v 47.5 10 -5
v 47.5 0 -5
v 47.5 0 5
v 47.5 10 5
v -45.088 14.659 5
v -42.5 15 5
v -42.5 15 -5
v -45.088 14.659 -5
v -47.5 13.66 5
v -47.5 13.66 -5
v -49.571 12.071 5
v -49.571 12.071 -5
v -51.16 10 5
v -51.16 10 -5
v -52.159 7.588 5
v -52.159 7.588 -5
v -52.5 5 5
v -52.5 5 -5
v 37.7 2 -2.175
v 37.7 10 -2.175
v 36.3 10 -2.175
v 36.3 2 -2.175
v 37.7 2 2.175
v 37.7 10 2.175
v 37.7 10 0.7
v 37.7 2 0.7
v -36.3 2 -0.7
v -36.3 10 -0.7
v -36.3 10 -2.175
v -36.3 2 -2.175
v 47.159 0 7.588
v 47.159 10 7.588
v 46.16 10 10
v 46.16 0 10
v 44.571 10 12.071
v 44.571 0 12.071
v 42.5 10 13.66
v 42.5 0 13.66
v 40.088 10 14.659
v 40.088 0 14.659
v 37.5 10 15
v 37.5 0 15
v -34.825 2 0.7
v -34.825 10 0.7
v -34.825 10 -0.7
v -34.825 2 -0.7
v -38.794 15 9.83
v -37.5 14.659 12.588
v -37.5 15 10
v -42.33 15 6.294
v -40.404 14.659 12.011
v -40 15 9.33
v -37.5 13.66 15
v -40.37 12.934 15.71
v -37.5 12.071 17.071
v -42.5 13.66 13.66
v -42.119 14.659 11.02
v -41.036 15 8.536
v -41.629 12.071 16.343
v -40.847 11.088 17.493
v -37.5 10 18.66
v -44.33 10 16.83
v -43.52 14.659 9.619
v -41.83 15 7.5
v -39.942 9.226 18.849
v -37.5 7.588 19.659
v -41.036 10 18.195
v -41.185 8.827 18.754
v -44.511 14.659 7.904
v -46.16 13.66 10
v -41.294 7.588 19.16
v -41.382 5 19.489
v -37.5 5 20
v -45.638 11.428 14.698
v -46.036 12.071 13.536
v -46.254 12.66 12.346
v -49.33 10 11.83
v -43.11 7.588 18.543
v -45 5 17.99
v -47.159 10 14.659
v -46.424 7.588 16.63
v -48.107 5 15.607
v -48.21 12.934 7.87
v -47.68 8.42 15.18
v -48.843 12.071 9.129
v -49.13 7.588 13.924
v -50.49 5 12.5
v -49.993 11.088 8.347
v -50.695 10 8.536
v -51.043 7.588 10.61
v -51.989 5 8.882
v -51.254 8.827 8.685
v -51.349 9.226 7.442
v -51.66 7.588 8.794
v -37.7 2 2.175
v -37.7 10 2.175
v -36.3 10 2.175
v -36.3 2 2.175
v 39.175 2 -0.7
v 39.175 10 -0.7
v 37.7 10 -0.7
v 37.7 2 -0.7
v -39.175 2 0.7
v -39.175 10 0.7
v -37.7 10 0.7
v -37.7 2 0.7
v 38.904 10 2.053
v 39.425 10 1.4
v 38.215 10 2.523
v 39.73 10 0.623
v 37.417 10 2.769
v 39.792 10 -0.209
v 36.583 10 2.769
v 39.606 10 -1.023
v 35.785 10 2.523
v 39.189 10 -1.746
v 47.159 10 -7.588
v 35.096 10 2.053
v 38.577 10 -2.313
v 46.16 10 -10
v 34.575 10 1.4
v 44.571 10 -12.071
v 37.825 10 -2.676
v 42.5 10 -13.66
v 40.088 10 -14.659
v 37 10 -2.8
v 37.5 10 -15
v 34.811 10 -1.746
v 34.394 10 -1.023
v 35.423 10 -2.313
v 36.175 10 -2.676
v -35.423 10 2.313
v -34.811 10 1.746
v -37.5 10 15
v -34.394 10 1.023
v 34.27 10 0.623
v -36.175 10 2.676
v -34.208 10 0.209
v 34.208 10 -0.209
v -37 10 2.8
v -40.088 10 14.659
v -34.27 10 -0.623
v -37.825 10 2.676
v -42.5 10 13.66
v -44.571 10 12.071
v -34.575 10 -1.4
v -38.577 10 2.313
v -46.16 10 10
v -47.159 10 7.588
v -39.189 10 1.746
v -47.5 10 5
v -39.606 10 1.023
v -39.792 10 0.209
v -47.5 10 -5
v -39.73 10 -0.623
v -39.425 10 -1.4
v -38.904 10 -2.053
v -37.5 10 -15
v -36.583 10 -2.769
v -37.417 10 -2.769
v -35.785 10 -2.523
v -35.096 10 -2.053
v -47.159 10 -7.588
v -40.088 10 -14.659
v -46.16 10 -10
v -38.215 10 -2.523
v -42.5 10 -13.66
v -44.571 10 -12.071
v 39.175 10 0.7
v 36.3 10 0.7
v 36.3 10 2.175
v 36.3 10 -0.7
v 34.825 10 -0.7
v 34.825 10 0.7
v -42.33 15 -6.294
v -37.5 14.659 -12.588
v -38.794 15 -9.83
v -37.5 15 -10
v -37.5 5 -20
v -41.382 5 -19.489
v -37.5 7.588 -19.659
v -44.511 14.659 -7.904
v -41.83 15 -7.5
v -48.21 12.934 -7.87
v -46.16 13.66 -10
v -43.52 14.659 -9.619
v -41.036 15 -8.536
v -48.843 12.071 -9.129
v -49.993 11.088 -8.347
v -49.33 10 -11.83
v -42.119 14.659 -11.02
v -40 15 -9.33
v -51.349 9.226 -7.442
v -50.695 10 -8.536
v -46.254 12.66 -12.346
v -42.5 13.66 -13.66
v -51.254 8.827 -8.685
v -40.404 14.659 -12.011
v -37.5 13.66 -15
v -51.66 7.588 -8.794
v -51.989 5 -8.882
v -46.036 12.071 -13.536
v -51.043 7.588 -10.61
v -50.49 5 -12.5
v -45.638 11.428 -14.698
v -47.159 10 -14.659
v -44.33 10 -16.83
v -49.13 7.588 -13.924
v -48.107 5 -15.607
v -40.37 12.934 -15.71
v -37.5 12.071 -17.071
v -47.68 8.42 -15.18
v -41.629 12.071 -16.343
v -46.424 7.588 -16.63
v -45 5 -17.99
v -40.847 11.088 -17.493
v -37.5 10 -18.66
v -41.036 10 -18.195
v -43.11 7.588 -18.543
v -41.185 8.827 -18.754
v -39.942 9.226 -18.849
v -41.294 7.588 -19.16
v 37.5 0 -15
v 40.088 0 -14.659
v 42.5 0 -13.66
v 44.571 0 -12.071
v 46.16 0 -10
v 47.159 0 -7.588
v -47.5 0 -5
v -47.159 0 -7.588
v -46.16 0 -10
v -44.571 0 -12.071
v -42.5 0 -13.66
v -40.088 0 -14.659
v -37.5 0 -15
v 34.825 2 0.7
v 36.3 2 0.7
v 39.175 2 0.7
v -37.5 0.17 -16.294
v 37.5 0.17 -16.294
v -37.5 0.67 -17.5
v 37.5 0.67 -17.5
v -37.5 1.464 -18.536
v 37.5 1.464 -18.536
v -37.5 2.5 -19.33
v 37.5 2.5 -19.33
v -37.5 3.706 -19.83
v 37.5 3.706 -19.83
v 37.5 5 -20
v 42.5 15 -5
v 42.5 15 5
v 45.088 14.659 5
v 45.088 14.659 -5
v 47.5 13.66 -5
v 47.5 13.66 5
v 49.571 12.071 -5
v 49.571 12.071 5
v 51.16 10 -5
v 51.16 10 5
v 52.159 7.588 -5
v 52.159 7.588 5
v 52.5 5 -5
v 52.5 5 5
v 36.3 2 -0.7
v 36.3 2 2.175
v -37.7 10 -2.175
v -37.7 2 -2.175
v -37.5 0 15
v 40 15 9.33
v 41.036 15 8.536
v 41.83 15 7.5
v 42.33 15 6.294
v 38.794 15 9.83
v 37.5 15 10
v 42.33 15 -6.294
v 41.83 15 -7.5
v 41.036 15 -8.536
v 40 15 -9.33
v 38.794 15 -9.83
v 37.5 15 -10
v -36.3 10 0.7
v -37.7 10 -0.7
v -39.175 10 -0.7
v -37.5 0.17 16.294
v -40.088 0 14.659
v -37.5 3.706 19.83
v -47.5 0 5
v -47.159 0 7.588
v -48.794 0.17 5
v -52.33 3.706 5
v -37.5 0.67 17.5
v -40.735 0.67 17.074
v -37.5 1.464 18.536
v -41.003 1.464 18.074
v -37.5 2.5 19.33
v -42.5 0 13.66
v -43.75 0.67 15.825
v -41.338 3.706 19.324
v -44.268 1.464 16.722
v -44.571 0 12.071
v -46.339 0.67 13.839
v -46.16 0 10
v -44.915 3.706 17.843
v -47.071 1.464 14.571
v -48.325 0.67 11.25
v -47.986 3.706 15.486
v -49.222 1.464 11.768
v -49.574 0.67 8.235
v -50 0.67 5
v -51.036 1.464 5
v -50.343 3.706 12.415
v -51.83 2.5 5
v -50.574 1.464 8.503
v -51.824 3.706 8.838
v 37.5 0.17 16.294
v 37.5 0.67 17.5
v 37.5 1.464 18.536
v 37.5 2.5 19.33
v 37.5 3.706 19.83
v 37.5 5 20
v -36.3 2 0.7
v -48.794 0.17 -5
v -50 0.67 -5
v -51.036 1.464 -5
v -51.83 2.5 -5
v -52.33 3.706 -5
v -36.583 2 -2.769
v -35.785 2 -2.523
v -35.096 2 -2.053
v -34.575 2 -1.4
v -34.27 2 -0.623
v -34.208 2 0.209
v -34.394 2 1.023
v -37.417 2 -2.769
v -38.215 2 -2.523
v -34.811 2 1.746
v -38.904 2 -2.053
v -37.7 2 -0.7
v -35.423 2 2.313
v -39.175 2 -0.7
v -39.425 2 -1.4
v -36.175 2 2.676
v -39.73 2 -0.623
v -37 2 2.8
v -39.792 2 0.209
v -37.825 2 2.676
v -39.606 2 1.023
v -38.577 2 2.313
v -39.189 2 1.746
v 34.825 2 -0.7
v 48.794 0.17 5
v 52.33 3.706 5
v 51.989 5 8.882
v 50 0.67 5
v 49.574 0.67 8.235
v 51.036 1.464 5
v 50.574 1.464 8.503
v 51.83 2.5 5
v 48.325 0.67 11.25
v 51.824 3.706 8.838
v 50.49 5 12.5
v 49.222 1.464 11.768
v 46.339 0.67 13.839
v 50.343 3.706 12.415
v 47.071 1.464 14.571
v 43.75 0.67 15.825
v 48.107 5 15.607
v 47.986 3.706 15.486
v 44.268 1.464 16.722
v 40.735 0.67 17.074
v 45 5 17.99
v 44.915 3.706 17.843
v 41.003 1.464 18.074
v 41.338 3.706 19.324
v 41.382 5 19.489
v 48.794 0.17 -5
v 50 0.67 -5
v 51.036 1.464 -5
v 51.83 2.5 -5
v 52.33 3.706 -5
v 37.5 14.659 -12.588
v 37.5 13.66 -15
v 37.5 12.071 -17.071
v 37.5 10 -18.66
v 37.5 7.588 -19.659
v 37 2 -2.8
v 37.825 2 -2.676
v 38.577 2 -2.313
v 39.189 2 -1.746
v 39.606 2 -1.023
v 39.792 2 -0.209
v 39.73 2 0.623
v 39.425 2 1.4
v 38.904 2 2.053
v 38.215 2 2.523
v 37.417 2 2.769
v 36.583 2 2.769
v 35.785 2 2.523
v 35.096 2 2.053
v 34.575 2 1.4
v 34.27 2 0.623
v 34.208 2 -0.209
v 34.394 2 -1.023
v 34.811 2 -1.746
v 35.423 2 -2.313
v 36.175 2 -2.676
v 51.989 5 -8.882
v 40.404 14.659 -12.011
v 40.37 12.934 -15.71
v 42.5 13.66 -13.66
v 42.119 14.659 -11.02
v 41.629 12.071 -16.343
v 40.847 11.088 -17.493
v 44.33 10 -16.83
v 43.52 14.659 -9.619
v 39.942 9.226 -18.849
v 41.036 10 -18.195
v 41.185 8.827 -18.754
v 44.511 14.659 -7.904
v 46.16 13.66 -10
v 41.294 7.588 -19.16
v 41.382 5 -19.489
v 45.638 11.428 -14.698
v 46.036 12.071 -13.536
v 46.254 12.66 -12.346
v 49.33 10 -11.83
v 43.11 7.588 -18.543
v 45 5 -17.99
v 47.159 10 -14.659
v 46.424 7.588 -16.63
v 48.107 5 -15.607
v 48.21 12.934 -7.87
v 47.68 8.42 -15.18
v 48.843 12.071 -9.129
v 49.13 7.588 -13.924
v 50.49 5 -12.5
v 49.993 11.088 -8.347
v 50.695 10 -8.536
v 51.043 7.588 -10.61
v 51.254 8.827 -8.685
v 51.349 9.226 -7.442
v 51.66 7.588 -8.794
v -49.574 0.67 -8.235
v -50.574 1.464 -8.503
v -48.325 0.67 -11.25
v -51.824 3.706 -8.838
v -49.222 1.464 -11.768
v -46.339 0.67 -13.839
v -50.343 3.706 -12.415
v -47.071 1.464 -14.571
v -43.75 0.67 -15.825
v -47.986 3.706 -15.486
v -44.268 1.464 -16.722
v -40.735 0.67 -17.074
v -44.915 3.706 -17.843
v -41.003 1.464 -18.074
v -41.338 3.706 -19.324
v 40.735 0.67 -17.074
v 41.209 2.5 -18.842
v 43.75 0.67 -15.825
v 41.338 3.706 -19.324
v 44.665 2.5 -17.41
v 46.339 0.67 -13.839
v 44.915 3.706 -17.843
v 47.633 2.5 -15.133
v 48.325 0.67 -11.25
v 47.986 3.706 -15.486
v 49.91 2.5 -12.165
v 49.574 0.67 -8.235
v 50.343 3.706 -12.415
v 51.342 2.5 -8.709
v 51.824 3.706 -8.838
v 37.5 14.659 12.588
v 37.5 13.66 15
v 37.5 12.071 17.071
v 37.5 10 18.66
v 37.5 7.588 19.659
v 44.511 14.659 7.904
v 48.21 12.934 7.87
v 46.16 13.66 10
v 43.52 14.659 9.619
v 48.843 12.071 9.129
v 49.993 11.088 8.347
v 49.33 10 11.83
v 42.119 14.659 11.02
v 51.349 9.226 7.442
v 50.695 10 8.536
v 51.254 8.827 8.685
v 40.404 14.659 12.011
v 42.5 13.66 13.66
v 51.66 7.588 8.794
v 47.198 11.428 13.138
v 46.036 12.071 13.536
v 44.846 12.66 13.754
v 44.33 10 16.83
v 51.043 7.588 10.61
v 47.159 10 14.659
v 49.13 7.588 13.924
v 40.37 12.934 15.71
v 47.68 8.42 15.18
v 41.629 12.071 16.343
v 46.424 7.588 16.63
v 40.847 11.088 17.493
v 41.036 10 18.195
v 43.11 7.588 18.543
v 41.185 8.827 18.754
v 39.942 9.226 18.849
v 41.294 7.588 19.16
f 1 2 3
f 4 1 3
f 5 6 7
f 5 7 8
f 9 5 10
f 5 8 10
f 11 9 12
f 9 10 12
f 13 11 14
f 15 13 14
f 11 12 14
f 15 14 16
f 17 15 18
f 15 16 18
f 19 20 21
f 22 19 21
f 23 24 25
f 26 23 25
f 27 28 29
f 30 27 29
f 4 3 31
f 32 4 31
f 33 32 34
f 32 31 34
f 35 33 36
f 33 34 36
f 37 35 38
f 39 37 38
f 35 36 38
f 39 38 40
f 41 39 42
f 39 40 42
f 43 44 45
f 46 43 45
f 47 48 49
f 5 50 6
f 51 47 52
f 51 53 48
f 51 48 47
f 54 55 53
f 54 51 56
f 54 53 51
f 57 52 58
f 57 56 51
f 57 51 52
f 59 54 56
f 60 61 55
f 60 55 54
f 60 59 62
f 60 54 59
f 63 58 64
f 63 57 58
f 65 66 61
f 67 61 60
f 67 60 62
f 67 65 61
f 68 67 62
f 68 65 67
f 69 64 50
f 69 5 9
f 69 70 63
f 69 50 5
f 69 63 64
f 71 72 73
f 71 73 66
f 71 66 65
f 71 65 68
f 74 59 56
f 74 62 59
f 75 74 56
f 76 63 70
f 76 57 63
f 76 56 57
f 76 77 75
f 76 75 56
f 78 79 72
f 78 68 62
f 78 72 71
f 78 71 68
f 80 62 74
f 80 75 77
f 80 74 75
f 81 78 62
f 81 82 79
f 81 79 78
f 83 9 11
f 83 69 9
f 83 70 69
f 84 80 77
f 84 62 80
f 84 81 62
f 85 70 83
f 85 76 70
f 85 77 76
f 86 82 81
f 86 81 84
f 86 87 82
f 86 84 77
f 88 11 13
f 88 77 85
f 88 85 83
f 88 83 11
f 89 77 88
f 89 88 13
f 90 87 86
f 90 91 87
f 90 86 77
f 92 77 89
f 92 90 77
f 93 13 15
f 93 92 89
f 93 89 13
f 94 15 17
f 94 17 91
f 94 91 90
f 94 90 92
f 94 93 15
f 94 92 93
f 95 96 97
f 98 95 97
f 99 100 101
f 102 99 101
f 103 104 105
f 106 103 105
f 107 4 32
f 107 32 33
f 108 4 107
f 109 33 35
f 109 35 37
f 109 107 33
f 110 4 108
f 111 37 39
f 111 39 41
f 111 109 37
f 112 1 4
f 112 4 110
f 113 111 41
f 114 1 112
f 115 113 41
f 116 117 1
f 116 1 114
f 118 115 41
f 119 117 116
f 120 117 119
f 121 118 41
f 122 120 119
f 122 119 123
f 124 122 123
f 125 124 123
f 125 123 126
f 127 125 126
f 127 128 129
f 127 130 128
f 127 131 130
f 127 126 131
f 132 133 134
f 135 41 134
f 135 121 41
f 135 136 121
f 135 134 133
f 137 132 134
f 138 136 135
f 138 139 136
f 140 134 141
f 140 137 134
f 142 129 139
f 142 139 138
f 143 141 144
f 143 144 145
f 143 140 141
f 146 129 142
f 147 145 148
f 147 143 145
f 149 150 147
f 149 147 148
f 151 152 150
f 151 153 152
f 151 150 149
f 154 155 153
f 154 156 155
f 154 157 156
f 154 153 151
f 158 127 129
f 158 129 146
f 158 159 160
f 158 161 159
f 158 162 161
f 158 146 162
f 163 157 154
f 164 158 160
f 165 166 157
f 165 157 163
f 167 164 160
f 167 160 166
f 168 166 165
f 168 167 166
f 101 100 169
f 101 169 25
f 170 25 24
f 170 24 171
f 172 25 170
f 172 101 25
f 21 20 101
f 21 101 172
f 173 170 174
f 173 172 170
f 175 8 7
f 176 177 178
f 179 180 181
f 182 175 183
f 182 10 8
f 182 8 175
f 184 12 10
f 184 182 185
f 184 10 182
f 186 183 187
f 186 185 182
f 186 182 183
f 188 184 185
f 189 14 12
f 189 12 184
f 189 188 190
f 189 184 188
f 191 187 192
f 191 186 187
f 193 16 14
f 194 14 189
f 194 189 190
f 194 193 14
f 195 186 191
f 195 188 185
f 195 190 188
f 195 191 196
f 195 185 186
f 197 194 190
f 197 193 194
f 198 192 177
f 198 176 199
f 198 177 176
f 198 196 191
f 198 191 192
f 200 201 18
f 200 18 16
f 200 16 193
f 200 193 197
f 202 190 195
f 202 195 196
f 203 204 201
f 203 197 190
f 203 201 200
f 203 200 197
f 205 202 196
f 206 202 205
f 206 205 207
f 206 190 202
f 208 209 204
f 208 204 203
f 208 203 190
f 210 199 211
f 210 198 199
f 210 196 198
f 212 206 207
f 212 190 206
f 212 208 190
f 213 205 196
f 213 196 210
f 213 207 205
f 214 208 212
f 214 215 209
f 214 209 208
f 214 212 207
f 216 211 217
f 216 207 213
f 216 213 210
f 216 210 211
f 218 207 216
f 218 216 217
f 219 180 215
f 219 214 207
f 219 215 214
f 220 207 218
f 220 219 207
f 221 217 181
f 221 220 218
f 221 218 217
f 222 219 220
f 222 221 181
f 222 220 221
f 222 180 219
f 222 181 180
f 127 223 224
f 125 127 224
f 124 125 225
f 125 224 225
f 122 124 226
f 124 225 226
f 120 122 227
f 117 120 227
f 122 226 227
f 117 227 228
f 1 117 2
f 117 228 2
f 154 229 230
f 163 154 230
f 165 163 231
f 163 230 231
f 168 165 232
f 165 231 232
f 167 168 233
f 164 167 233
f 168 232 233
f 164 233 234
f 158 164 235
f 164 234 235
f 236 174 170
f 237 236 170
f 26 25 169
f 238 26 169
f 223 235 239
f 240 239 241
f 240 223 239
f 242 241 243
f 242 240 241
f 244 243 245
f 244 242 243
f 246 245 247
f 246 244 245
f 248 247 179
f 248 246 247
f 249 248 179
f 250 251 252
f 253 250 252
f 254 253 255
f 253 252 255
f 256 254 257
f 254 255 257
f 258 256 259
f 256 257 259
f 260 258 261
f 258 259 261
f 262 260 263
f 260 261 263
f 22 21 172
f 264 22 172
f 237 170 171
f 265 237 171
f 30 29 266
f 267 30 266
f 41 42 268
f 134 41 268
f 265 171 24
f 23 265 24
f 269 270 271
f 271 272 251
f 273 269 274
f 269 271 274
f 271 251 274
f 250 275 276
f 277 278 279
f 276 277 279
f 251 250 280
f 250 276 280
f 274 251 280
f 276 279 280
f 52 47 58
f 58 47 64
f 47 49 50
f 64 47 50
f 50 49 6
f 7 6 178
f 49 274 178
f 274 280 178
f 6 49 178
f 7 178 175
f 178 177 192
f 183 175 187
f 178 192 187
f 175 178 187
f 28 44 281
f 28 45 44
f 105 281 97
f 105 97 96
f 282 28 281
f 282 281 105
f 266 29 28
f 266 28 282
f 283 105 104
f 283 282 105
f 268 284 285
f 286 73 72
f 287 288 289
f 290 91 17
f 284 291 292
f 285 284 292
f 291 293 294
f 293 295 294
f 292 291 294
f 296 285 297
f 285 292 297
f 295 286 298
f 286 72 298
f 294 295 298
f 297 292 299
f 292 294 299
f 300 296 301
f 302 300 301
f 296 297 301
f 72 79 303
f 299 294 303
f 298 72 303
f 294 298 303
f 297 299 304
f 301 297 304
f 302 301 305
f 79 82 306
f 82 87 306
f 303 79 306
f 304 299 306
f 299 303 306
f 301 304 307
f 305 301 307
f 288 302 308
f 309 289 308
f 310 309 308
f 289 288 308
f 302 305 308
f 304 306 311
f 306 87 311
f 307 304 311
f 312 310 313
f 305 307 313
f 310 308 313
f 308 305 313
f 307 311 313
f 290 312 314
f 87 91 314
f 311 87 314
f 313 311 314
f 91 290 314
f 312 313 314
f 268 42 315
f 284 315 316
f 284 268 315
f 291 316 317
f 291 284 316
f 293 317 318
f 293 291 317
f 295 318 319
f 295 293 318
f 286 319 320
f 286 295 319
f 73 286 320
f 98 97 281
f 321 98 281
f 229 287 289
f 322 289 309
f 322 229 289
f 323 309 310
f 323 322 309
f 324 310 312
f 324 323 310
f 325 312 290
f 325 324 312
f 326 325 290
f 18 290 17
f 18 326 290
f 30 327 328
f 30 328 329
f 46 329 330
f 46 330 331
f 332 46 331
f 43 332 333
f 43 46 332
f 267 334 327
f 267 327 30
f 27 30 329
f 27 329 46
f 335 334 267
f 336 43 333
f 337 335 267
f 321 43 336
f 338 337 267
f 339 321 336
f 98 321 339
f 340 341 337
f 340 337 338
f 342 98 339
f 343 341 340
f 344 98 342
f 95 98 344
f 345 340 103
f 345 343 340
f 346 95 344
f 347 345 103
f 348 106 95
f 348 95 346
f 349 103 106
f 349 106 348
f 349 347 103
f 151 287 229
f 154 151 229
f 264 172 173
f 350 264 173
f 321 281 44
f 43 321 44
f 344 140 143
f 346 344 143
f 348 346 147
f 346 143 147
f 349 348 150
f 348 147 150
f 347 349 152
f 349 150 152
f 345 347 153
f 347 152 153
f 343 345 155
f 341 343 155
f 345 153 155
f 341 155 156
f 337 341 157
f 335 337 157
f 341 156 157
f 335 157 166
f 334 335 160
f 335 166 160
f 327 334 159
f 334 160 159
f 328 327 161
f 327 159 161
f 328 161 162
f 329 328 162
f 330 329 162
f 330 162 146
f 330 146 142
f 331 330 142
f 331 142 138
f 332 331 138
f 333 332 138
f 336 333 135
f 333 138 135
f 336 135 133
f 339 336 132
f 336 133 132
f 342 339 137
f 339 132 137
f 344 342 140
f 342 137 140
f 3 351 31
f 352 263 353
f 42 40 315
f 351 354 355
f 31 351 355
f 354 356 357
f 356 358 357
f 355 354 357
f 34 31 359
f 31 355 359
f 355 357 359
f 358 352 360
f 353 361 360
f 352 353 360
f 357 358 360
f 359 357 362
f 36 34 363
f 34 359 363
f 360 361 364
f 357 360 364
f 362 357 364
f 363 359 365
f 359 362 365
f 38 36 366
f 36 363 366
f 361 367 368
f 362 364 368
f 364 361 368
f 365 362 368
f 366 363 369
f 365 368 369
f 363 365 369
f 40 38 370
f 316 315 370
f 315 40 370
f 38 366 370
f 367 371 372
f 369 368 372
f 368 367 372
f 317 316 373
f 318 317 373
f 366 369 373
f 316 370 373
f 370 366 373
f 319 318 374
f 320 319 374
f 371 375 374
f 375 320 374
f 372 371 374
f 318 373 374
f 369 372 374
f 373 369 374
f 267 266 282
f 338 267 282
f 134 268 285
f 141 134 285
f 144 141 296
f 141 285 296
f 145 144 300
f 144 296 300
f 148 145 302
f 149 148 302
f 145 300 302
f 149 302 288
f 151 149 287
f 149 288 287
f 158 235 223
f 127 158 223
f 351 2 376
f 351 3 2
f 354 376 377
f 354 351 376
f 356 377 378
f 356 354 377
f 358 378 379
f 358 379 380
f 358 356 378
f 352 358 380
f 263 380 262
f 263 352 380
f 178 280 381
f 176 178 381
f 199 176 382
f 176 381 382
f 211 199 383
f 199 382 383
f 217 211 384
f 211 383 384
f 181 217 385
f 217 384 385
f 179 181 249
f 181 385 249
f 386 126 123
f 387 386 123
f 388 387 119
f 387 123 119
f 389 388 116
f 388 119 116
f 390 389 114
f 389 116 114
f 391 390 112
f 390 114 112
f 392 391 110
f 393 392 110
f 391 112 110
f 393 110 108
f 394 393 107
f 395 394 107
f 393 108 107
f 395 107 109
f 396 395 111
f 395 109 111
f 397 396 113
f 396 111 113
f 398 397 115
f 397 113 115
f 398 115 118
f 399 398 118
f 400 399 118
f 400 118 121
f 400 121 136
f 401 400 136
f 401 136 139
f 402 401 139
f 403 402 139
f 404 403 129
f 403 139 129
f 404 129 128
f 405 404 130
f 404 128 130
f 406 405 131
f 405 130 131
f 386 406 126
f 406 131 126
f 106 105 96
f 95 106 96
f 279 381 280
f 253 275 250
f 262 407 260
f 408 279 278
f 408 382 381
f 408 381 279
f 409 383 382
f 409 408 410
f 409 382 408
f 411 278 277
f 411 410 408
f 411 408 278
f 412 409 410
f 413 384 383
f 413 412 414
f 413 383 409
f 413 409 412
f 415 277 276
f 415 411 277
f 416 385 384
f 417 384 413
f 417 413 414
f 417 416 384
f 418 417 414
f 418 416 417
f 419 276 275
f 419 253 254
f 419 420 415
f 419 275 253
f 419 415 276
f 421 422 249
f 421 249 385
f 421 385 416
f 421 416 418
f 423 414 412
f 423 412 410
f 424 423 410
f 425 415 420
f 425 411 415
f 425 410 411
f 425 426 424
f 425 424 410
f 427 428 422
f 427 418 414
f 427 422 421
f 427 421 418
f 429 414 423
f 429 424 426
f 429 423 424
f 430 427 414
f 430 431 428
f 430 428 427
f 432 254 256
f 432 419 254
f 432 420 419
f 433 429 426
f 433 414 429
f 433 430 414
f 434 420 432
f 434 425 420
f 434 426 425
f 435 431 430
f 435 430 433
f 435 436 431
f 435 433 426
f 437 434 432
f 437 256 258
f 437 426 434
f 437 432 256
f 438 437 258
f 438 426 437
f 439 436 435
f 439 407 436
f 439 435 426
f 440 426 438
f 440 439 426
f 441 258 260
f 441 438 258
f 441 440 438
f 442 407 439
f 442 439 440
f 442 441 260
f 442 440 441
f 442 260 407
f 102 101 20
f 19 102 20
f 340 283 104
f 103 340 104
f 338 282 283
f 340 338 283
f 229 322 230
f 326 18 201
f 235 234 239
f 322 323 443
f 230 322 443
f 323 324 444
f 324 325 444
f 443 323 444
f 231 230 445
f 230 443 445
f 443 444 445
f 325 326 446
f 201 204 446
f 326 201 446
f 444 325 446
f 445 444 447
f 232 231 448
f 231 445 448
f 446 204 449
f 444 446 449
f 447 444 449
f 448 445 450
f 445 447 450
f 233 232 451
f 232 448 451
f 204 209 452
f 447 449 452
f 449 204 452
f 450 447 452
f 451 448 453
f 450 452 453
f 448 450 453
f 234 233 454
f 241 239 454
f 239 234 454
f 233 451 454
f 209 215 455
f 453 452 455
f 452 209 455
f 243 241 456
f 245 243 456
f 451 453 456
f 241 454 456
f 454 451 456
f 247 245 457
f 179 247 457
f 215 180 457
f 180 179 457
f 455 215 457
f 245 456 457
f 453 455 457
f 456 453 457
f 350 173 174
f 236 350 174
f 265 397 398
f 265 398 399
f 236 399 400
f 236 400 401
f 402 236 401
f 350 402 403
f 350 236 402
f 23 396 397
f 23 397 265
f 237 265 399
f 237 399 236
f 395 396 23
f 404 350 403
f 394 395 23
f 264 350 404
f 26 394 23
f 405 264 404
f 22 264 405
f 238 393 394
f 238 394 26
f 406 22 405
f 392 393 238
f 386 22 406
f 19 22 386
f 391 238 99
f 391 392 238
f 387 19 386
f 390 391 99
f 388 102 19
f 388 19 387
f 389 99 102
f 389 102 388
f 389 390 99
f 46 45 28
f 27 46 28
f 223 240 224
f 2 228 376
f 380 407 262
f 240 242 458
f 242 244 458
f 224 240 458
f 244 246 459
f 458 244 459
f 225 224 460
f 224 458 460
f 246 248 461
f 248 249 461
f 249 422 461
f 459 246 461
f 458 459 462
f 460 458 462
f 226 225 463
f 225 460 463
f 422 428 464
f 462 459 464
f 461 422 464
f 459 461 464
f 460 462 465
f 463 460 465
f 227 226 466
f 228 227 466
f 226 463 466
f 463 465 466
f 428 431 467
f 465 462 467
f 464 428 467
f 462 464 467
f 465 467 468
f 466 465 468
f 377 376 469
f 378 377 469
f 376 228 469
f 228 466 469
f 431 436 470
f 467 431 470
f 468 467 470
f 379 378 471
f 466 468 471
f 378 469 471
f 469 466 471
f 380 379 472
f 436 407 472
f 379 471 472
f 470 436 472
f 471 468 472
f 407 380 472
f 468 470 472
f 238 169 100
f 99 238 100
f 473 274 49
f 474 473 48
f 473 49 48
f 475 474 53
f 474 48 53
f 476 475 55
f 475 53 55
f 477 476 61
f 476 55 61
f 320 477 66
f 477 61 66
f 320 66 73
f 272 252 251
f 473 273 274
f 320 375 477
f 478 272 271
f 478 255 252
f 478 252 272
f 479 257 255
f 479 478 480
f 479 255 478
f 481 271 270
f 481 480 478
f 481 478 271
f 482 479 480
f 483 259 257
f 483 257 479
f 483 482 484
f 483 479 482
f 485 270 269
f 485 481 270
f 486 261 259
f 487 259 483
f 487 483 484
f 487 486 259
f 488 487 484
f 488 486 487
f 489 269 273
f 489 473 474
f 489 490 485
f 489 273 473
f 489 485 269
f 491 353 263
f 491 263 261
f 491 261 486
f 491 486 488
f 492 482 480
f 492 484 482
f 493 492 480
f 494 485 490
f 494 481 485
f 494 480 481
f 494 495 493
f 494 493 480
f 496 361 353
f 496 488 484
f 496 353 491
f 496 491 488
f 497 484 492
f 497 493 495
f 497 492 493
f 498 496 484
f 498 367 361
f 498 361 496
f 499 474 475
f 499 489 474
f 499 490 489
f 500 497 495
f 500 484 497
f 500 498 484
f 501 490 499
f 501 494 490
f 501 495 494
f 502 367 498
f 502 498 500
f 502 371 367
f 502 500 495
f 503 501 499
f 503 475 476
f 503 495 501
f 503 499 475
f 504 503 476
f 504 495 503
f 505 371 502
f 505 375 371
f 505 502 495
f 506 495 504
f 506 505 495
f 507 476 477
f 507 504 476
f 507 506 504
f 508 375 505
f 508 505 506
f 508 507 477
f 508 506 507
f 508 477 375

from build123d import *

# Parameters (mm, degrees)
EXTRUDE_1_DEPTH = 10
SHELL_2_T       = 5
FILLET_3_R      = 10
FILLET_4_R      = 5
SKETCH_2_R      = 2.8
EXTRUDE_2_DEPTH = 8


# Some blends are built 0.0001 mm under size
with BuildPart() as part:
    # 草图1 → 凸台-拉伸1 (new body)
    with BuildSketch(Plane(origin=(0, 0, 0), x_dir=(1, 0, 0), z_dir=(0, 1, 0))):
        with BuildLine():
            Line((-37.5, 15), (37.5, 15))
            ThreePointArc((37.5, 15), (44.571067812, 12.071067812), (47.5, 5))
            Line((47.5, 5), (47.5, -5))
            ThreePointArc((47.5, -5), (44.571067812, -12.071067812), (37.5, -15))
            Line((37.5, -15), (-37.5, -15))
            ThreePointArc((-37.5, -15), (-44.571067812, -12.071067812), (-47.5, -5))
            Line((-47.5, -5), (-47.5, 5))
            ThreePointArc((-47.5, 5), (-44.571067812, 12.071067812), (-37.5, 15))
        make_face()
    extrude(amount=EXTRUDE_1_DEPTH)

    # 抽壳2
    shell_2_openings = [part.faces().sort_by_distance(p)[0] for p in [
        (0, 0, 0),
    ]]
    offset(amount=SHELL_2_T, openings=shell_2_openings, kind=Kind.INTERSECTION)

    # 圆角3
    # the kernel refuses this fillet: 10 mm, written as the material it takes off along each edge
    with BuildSketch(Plane(origin=(37.5, 15, 5), x_dir=(1, 0, 0), z_dir=(0, 0, -1))) as fillet_3_piece_1:
        with BuildLine():
            CenterArc((15 - FILLET_3_R, FILLET_3_R), FILLET_3_R, 270, 90)
            Line((15 - FILLET_3_R, 0), (15, 0))
            Line((15, 0), (15, FILLET_3_R))
        make_face()
    revolve(axis=Axis((37.5, 15, 5), (0, -1, 0)), revolution_arc=90, mode=Mode.SUBTRACT)
    with BuildSketch(Plane(origin=(52.5, 15, 5), x_dir=(0, -1, 0), z_dir=(0, 0, -1)), Plane(origin=(-52.5, 15, -5), x_dir=(0, -1, 0), z_dir=(0, 0, 1))) as fillet_3_piece_2:
        with BuildLine():
            CenterArc((FILLET_3_R, FILLET_3_R), FILLET_3_R, 180, 90)
            Line((0, FILLET_3_R), (0, 0))
            Line((0, 0), (FILLET_3_R, 0))
        make_face()
    extrude(amount=10, mode=Mode.SUBTRACT)
    with BuildSketch(Plane(origin=(37.5, 15, -5), x_dir=(0, 0, -1), z_dir=(-1, 0, 0))) as fillet_3_piece_3:
        with BuildLine():
            CenterArc((15 - FILLET_3_R, FILLET_3_R), FILLET_3_R, 270, 90)
            Line((15 - FILLET_3_R, 0), (15, 0))
            Line((15, 0), (15, FILLET_3_R))
        make_face()
    revolve(axis=Axis((37.5, 15, -5), (0, -1, 0)), revolution_arc=90, mode=Mode.SUBTRACT)
    with BuildSketch(Plane(origin=(37.5, 15, -20), x_dir=(0, -1, 0), z_dir=(-1, 0, 0)), Plane(origin=(-37.5, 15, 20), x_dir=(0, -1, 0), z_dir=(1, 0, 0))) as fillet_3_piece_4:
        with BuildLine():
            CenterArc((FILLET_3_R, FILLET_3_R), FILLET_3_R, 180, 90)
            Line((0, FILLET_3_R), (0, 0))
            Line((0, 0), (FILLET_3_R, 0))
        make_face()
    extrude(amount=75, mode=Mode.SUBTRACT)
    with BuildSketch(Plane(origin=(-37.5, 15, -5), x_dir=(-1, 0, 0), z_dir=(0, 0, 1))) as fillet_3_piece_5:
        with BuildLine():
            CenterArc((15 - FILLET_3_R, FILLET_3_R), FILLET_3_R, 270, 90)
            Line((15 - FILLET_3_R, 0), (15, 0))
            Line((15, 0), (15, FILLET_3_R))
        make_face()
    revolve(axis=Axis((-37.5, 15, -5), (0, -1, 0)), revolution_arc=90, mode=Mode.SUBTRACT)
    with BuildSketch(Plane(origin=(-37.5, 15, 5), x_dir=(0, 0, 1), z_dir=(1, 0, 0))) as fillet_3_piece_6:
        with BuildLine():
            CenterArc((15 - FILLET_3_R, FILLET_3_R), FILLET_3_R, 270, 90)
            Line((15 - FILLET_3_R, 0), (15, 0))
            Line((15, 0), (15, FILLET_3_R))
        make_face()
    revolve(axis=Axis((-37.5, 15, 5), (0, -1, 0)), revolution_arc=90, mode=Mode.SUBTRACT)

    # 圆角4
    fillet_4_edges = [part.edges().sort_by_distance(p)[0] for p in [
        (52.5, 0, 0),
        (48.106601718, 0, 15.606601718),
        (0, 0, 20),
        (-48.106601718, 0, 15.606601718),
        (-52.5, 0, 0),
        (-48.106601718, 0, -15.606601718),
        (0, 0, -20),
        (48.106601718, 0, -15.606601718),
    ]]
    fillet(fillet_4_edges, radius=FILLET_4_R - 0.0001)  # a hair under: the kernel refuses the full size

    # 草图2 → 凸台-拉伸2 (add)
    # profile 1 of 2: a face of its own
    with BuildSketch(Plane(origin=(0, 10, 0), x_dir=(-1, 0, 0), z_dir=(0, -1, 0))):
        with Locations(Location((37, 0, 0), (0, 0, 270))):
            Circle(SKETCH_2_R)
        Polygon((34.825, -0.7), (34.825, 0.7), (36.3, 0.7), (36.3, 2.175), (37.7, 2.175), (37.7, 0.7), (39.175, 0.7), (39.175, -0.7), (37.7, -0.7), (37.7, -2.175), (36.3, -2.175), (36.3, -0.7), align=None, mode=Mode.SUBTRACT)
    # profile 2 of 2: a face of its own
    with BuildSketch(Plane(origin=(0, 10, 0), x_dir=(-1, 0, 0), z_dir=(0, -1, 0))):
        with Locations(Location((-37, 0, 0), (0, 0, 90))):
            Circle(SKETCH_2_R)
        Polygon((-37.7, 0.7), (-37.7, 2.175), (-36.3, 2.175), (-36.3, 0.7), (-34.825, 0.7), (-34.825, -0.7), (-36.3, -0.7), (-36.3, -2.175), (-37.7, -2.175), (-37.7, -0.7), (-39.175, -0.7), (-39.175, 0.7), align=None, mode=Mode.SUBTRACT)
    extrude(amount=EXTRUDE_2_DEPTH)


solid = part.part
